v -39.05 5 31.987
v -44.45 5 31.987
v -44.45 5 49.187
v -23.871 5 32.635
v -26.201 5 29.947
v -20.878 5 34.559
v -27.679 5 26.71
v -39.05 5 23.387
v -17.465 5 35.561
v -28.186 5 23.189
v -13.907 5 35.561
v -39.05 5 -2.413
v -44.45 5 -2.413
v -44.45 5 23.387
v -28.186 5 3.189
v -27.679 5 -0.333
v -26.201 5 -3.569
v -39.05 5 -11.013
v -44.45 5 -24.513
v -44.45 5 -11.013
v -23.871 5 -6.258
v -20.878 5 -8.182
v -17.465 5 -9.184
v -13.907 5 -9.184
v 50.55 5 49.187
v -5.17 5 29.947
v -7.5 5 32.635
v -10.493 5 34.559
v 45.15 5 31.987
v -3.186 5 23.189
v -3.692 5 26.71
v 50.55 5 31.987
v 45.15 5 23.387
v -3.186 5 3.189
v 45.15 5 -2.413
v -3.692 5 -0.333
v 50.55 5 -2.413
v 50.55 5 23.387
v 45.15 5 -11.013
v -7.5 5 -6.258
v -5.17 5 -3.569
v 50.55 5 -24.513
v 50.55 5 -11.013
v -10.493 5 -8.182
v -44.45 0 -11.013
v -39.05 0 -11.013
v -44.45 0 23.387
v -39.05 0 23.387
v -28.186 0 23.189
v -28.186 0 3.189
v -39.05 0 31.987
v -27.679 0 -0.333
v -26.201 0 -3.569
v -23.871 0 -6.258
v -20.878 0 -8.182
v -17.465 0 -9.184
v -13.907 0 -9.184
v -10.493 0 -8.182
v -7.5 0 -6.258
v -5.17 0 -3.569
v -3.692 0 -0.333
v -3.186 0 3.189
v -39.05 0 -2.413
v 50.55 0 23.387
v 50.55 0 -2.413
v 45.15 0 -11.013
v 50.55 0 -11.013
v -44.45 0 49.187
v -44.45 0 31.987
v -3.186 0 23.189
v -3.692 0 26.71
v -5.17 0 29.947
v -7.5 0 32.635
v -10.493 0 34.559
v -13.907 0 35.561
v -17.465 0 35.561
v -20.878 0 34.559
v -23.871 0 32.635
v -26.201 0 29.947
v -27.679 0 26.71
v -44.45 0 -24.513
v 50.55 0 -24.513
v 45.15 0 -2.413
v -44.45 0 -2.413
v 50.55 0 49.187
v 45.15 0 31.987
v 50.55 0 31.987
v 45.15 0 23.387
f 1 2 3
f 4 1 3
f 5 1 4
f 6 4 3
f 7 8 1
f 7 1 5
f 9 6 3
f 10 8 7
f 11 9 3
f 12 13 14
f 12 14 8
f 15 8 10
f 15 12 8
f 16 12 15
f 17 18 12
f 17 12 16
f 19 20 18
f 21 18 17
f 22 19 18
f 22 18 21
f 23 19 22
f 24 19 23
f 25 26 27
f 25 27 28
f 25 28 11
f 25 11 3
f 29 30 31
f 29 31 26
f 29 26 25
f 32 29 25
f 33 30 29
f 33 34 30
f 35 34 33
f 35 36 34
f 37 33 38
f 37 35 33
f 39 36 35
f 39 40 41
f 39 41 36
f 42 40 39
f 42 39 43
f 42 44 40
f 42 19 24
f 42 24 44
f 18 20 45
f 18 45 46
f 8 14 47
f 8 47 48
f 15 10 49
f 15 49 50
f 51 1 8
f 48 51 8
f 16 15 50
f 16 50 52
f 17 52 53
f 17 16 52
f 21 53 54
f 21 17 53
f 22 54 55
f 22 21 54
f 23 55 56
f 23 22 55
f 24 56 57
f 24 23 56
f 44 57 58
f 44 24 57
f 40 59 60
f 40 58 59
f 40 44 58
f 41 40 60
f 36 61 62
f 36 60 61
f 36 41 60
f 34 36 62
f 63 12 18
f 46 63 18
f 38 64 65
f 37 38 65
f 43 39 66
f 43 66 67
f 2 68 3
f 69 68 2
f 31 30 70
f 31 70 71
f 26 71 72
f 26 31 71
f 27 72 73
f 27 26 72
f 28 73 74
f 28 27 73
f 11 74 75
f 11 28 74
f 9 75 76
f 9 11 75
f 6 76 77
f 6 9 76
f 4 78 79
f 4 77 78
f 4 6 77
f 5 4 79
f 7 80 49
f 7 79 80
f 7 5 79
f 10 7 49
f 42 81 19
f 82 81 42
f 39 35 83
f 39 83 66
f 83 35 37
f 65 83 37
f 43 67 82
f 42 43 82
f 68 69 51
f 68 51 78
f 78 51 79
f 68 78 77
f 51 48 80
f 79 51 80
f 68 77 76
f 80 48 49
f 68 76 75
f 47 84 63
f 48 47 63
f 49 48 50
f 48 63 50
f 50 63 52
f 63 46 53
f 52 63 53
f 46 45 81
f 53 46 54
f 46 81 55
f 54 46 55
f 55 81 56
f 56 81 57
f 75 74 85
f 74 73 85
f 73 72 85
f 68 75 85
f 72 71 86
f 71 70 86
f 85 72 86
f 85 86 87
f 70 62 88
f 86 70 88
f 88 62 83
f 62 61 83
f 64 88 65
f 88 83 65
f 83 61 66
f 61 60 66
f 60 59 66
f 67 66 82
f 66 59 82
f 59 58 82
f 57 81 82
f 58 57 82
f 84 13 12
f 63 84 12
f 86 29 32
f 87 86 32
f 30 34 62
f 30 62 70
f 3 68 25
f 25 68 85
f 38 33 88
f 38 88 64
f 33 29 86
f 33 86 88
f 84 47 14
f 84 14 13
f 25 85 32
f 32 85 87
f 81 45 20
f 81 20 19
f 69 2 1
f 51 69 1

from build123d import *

# Parameters (mm, degrees)
SKETCH1_W           = 95
SKETCH1_H           = 73.7
BOSS_EXTRUDE1_DEPTH = 5
CUT_EXTRUDE1_REACH  = 7
SKETCH2_W           = 5.4
SKETCH2_H           = 8.6
CUT_EXTRUDE2_REACH  = 7


with BuildPart() as part:
    # Sketch1 → Boss-Extrude1 (new body)
    with BuildSketch(Plane(origin=(0, 0, 0), x_dir=(1, 0, 0), z_dir=(0, 1, 0))):
        with Locations((3.050458716, -12.337385321)):
            Rectangle(SKETCH1_W, SKETCH1_H)
    extrude(amount=BOSS_EXTRUDE1_DEPTH)

    # Sketch2 → Cut-Extrude1 (cut, up to next)
    with BuildSketch(Plane(origin=(0, 5, 0), x_dir=(1, 0, 0), z_dir=(0, 1, 0)), mode=Mode.PRIVATE) as cut_extrude1_sk1:
        with Locations((-41.749541284, 6.712614679)):
            Rectangle(SKETCH2_W, SKETCH2_H)
    cut_extrude1_tool1 = extrude(cut_extrude1_sk1.sketch, amount=-CUT_EXTRUDE1_REACH, mode=Mode.PRIVATE) & part.part
    add(cut_extrude1_tool1.solids().sort_by_distance((-41.749541, 5, -6.712615))[0], mode=Mode.SUBTRACT)
    # Sketch2 → Cut-Extrude1 (cut, up to next)
    with BuildSketch(Plane(origin=(0, 5, 0), x_dir=(1, 0, 0), z_dir=(0, 1, 0)), mode=Mode.PRIVATE) as cut_extrude1_sk2:
        with Locations((-41.749541284, -27.687385321)):
            Rectangle(SKETCH2_W, SKETCH2_H)
    cut_extrude1_tool2 = extrude(cut_extrude1_sk2.sketch, amount=-CUT_EXTRUDE1_REACH, mode=Mode.PRIVATE) & part.part
    add(cut_extrude1_tool2.solids().sort_by_distance((-41.749541, 5, 27.687385))[0], mode=Mode.SUBTRACT)
    # Sketch2 → Cut-Extrude1 (cut, up to next)
    with BuildSketch(Plane(origin=(0, 5, 0), x_dir=(1, 0, 0), z_dir=(0, 1, 0)), mode=Mode.PRIVATE) as cut_extrude1_sk3:
        with Locations((47.850458716, 6.712614679)):
            Rectangle(SKETCH2_W, SKETCH2_H)
    cut_extrude1_tool3 = extrude(cut_extrude1_sk3.sketch, amount=-CUT_EXTRUDE1_REACH, mode=Mode.PRIVATE) & part.part
    add(cut_extrude1_tool3.solids().sort_by_distance((47.850459, 5, -6.712615))[0], mode=Mode.SUBTRACT)
    # Sketch2 → Cut-Extrude1 (cut, up to next)
    with BuildSketch(Plane(origin=(0, 5, 0), x_dir=(1, 0, 0), z_dir=(0, 1, 0)), mode=Mode.PRIVATE) as cut_extrude1_sk4:
        with Locations((47.850458716, -27.687385321)):
            Rectangle(SKETCH2_W, SKETCH2_H)
    cut_extrude1_tool4 = extrude(cut_extrude1_sk4.sketch, amount=-CUT_EXTRUDE1_REACH, mode=Mode.PRIVATE) & part.part
    add(cut_extrude1_tool4.solids().sort_by_distance((47.850459, 5, 27.687385))[0], mode=Mode.SUBTRACT)

    # Sketch3 → Cut-Extrude2 (cut, up to next)
    with BuildSketch(Plane(origin=(0, 5, 0), x_dir=(1, 0, 0), z_dir=(0, 1, 0)), mode=Mode.PRIVATE) as cut_extrude2_sk1:
        with BuildLine():
            Line((-3.185639247, -3.188538713), (-3.185639247, -23.188538713))
            ThreePointArc((-3.185639247, -23.188538713), (-15.685639247, -35.688538713), (-28.185639247, -23.188538713))
            Line((-28.185639247, -23.188538713), (-28.185639247, -3.188538713))
            ThreePointArc((-28.185639247, -3.188538713), (-15.685639247, 9.311461287), (-3.185639247, -3.188538713))
        make_face()
    cut_extrude2_tool1 = extrude(cut_extrude2_sk1.sketch, amount=-CUT_EXTRUDE2_REACH, mode=Mode.PRIVATE) & part.part
    add(cut_extrude2_tool1.solids().sort_by_distance((-15.685639, 5, 13.188539))[0], mode=Mode.SUBTRACT)


solid = part.part
